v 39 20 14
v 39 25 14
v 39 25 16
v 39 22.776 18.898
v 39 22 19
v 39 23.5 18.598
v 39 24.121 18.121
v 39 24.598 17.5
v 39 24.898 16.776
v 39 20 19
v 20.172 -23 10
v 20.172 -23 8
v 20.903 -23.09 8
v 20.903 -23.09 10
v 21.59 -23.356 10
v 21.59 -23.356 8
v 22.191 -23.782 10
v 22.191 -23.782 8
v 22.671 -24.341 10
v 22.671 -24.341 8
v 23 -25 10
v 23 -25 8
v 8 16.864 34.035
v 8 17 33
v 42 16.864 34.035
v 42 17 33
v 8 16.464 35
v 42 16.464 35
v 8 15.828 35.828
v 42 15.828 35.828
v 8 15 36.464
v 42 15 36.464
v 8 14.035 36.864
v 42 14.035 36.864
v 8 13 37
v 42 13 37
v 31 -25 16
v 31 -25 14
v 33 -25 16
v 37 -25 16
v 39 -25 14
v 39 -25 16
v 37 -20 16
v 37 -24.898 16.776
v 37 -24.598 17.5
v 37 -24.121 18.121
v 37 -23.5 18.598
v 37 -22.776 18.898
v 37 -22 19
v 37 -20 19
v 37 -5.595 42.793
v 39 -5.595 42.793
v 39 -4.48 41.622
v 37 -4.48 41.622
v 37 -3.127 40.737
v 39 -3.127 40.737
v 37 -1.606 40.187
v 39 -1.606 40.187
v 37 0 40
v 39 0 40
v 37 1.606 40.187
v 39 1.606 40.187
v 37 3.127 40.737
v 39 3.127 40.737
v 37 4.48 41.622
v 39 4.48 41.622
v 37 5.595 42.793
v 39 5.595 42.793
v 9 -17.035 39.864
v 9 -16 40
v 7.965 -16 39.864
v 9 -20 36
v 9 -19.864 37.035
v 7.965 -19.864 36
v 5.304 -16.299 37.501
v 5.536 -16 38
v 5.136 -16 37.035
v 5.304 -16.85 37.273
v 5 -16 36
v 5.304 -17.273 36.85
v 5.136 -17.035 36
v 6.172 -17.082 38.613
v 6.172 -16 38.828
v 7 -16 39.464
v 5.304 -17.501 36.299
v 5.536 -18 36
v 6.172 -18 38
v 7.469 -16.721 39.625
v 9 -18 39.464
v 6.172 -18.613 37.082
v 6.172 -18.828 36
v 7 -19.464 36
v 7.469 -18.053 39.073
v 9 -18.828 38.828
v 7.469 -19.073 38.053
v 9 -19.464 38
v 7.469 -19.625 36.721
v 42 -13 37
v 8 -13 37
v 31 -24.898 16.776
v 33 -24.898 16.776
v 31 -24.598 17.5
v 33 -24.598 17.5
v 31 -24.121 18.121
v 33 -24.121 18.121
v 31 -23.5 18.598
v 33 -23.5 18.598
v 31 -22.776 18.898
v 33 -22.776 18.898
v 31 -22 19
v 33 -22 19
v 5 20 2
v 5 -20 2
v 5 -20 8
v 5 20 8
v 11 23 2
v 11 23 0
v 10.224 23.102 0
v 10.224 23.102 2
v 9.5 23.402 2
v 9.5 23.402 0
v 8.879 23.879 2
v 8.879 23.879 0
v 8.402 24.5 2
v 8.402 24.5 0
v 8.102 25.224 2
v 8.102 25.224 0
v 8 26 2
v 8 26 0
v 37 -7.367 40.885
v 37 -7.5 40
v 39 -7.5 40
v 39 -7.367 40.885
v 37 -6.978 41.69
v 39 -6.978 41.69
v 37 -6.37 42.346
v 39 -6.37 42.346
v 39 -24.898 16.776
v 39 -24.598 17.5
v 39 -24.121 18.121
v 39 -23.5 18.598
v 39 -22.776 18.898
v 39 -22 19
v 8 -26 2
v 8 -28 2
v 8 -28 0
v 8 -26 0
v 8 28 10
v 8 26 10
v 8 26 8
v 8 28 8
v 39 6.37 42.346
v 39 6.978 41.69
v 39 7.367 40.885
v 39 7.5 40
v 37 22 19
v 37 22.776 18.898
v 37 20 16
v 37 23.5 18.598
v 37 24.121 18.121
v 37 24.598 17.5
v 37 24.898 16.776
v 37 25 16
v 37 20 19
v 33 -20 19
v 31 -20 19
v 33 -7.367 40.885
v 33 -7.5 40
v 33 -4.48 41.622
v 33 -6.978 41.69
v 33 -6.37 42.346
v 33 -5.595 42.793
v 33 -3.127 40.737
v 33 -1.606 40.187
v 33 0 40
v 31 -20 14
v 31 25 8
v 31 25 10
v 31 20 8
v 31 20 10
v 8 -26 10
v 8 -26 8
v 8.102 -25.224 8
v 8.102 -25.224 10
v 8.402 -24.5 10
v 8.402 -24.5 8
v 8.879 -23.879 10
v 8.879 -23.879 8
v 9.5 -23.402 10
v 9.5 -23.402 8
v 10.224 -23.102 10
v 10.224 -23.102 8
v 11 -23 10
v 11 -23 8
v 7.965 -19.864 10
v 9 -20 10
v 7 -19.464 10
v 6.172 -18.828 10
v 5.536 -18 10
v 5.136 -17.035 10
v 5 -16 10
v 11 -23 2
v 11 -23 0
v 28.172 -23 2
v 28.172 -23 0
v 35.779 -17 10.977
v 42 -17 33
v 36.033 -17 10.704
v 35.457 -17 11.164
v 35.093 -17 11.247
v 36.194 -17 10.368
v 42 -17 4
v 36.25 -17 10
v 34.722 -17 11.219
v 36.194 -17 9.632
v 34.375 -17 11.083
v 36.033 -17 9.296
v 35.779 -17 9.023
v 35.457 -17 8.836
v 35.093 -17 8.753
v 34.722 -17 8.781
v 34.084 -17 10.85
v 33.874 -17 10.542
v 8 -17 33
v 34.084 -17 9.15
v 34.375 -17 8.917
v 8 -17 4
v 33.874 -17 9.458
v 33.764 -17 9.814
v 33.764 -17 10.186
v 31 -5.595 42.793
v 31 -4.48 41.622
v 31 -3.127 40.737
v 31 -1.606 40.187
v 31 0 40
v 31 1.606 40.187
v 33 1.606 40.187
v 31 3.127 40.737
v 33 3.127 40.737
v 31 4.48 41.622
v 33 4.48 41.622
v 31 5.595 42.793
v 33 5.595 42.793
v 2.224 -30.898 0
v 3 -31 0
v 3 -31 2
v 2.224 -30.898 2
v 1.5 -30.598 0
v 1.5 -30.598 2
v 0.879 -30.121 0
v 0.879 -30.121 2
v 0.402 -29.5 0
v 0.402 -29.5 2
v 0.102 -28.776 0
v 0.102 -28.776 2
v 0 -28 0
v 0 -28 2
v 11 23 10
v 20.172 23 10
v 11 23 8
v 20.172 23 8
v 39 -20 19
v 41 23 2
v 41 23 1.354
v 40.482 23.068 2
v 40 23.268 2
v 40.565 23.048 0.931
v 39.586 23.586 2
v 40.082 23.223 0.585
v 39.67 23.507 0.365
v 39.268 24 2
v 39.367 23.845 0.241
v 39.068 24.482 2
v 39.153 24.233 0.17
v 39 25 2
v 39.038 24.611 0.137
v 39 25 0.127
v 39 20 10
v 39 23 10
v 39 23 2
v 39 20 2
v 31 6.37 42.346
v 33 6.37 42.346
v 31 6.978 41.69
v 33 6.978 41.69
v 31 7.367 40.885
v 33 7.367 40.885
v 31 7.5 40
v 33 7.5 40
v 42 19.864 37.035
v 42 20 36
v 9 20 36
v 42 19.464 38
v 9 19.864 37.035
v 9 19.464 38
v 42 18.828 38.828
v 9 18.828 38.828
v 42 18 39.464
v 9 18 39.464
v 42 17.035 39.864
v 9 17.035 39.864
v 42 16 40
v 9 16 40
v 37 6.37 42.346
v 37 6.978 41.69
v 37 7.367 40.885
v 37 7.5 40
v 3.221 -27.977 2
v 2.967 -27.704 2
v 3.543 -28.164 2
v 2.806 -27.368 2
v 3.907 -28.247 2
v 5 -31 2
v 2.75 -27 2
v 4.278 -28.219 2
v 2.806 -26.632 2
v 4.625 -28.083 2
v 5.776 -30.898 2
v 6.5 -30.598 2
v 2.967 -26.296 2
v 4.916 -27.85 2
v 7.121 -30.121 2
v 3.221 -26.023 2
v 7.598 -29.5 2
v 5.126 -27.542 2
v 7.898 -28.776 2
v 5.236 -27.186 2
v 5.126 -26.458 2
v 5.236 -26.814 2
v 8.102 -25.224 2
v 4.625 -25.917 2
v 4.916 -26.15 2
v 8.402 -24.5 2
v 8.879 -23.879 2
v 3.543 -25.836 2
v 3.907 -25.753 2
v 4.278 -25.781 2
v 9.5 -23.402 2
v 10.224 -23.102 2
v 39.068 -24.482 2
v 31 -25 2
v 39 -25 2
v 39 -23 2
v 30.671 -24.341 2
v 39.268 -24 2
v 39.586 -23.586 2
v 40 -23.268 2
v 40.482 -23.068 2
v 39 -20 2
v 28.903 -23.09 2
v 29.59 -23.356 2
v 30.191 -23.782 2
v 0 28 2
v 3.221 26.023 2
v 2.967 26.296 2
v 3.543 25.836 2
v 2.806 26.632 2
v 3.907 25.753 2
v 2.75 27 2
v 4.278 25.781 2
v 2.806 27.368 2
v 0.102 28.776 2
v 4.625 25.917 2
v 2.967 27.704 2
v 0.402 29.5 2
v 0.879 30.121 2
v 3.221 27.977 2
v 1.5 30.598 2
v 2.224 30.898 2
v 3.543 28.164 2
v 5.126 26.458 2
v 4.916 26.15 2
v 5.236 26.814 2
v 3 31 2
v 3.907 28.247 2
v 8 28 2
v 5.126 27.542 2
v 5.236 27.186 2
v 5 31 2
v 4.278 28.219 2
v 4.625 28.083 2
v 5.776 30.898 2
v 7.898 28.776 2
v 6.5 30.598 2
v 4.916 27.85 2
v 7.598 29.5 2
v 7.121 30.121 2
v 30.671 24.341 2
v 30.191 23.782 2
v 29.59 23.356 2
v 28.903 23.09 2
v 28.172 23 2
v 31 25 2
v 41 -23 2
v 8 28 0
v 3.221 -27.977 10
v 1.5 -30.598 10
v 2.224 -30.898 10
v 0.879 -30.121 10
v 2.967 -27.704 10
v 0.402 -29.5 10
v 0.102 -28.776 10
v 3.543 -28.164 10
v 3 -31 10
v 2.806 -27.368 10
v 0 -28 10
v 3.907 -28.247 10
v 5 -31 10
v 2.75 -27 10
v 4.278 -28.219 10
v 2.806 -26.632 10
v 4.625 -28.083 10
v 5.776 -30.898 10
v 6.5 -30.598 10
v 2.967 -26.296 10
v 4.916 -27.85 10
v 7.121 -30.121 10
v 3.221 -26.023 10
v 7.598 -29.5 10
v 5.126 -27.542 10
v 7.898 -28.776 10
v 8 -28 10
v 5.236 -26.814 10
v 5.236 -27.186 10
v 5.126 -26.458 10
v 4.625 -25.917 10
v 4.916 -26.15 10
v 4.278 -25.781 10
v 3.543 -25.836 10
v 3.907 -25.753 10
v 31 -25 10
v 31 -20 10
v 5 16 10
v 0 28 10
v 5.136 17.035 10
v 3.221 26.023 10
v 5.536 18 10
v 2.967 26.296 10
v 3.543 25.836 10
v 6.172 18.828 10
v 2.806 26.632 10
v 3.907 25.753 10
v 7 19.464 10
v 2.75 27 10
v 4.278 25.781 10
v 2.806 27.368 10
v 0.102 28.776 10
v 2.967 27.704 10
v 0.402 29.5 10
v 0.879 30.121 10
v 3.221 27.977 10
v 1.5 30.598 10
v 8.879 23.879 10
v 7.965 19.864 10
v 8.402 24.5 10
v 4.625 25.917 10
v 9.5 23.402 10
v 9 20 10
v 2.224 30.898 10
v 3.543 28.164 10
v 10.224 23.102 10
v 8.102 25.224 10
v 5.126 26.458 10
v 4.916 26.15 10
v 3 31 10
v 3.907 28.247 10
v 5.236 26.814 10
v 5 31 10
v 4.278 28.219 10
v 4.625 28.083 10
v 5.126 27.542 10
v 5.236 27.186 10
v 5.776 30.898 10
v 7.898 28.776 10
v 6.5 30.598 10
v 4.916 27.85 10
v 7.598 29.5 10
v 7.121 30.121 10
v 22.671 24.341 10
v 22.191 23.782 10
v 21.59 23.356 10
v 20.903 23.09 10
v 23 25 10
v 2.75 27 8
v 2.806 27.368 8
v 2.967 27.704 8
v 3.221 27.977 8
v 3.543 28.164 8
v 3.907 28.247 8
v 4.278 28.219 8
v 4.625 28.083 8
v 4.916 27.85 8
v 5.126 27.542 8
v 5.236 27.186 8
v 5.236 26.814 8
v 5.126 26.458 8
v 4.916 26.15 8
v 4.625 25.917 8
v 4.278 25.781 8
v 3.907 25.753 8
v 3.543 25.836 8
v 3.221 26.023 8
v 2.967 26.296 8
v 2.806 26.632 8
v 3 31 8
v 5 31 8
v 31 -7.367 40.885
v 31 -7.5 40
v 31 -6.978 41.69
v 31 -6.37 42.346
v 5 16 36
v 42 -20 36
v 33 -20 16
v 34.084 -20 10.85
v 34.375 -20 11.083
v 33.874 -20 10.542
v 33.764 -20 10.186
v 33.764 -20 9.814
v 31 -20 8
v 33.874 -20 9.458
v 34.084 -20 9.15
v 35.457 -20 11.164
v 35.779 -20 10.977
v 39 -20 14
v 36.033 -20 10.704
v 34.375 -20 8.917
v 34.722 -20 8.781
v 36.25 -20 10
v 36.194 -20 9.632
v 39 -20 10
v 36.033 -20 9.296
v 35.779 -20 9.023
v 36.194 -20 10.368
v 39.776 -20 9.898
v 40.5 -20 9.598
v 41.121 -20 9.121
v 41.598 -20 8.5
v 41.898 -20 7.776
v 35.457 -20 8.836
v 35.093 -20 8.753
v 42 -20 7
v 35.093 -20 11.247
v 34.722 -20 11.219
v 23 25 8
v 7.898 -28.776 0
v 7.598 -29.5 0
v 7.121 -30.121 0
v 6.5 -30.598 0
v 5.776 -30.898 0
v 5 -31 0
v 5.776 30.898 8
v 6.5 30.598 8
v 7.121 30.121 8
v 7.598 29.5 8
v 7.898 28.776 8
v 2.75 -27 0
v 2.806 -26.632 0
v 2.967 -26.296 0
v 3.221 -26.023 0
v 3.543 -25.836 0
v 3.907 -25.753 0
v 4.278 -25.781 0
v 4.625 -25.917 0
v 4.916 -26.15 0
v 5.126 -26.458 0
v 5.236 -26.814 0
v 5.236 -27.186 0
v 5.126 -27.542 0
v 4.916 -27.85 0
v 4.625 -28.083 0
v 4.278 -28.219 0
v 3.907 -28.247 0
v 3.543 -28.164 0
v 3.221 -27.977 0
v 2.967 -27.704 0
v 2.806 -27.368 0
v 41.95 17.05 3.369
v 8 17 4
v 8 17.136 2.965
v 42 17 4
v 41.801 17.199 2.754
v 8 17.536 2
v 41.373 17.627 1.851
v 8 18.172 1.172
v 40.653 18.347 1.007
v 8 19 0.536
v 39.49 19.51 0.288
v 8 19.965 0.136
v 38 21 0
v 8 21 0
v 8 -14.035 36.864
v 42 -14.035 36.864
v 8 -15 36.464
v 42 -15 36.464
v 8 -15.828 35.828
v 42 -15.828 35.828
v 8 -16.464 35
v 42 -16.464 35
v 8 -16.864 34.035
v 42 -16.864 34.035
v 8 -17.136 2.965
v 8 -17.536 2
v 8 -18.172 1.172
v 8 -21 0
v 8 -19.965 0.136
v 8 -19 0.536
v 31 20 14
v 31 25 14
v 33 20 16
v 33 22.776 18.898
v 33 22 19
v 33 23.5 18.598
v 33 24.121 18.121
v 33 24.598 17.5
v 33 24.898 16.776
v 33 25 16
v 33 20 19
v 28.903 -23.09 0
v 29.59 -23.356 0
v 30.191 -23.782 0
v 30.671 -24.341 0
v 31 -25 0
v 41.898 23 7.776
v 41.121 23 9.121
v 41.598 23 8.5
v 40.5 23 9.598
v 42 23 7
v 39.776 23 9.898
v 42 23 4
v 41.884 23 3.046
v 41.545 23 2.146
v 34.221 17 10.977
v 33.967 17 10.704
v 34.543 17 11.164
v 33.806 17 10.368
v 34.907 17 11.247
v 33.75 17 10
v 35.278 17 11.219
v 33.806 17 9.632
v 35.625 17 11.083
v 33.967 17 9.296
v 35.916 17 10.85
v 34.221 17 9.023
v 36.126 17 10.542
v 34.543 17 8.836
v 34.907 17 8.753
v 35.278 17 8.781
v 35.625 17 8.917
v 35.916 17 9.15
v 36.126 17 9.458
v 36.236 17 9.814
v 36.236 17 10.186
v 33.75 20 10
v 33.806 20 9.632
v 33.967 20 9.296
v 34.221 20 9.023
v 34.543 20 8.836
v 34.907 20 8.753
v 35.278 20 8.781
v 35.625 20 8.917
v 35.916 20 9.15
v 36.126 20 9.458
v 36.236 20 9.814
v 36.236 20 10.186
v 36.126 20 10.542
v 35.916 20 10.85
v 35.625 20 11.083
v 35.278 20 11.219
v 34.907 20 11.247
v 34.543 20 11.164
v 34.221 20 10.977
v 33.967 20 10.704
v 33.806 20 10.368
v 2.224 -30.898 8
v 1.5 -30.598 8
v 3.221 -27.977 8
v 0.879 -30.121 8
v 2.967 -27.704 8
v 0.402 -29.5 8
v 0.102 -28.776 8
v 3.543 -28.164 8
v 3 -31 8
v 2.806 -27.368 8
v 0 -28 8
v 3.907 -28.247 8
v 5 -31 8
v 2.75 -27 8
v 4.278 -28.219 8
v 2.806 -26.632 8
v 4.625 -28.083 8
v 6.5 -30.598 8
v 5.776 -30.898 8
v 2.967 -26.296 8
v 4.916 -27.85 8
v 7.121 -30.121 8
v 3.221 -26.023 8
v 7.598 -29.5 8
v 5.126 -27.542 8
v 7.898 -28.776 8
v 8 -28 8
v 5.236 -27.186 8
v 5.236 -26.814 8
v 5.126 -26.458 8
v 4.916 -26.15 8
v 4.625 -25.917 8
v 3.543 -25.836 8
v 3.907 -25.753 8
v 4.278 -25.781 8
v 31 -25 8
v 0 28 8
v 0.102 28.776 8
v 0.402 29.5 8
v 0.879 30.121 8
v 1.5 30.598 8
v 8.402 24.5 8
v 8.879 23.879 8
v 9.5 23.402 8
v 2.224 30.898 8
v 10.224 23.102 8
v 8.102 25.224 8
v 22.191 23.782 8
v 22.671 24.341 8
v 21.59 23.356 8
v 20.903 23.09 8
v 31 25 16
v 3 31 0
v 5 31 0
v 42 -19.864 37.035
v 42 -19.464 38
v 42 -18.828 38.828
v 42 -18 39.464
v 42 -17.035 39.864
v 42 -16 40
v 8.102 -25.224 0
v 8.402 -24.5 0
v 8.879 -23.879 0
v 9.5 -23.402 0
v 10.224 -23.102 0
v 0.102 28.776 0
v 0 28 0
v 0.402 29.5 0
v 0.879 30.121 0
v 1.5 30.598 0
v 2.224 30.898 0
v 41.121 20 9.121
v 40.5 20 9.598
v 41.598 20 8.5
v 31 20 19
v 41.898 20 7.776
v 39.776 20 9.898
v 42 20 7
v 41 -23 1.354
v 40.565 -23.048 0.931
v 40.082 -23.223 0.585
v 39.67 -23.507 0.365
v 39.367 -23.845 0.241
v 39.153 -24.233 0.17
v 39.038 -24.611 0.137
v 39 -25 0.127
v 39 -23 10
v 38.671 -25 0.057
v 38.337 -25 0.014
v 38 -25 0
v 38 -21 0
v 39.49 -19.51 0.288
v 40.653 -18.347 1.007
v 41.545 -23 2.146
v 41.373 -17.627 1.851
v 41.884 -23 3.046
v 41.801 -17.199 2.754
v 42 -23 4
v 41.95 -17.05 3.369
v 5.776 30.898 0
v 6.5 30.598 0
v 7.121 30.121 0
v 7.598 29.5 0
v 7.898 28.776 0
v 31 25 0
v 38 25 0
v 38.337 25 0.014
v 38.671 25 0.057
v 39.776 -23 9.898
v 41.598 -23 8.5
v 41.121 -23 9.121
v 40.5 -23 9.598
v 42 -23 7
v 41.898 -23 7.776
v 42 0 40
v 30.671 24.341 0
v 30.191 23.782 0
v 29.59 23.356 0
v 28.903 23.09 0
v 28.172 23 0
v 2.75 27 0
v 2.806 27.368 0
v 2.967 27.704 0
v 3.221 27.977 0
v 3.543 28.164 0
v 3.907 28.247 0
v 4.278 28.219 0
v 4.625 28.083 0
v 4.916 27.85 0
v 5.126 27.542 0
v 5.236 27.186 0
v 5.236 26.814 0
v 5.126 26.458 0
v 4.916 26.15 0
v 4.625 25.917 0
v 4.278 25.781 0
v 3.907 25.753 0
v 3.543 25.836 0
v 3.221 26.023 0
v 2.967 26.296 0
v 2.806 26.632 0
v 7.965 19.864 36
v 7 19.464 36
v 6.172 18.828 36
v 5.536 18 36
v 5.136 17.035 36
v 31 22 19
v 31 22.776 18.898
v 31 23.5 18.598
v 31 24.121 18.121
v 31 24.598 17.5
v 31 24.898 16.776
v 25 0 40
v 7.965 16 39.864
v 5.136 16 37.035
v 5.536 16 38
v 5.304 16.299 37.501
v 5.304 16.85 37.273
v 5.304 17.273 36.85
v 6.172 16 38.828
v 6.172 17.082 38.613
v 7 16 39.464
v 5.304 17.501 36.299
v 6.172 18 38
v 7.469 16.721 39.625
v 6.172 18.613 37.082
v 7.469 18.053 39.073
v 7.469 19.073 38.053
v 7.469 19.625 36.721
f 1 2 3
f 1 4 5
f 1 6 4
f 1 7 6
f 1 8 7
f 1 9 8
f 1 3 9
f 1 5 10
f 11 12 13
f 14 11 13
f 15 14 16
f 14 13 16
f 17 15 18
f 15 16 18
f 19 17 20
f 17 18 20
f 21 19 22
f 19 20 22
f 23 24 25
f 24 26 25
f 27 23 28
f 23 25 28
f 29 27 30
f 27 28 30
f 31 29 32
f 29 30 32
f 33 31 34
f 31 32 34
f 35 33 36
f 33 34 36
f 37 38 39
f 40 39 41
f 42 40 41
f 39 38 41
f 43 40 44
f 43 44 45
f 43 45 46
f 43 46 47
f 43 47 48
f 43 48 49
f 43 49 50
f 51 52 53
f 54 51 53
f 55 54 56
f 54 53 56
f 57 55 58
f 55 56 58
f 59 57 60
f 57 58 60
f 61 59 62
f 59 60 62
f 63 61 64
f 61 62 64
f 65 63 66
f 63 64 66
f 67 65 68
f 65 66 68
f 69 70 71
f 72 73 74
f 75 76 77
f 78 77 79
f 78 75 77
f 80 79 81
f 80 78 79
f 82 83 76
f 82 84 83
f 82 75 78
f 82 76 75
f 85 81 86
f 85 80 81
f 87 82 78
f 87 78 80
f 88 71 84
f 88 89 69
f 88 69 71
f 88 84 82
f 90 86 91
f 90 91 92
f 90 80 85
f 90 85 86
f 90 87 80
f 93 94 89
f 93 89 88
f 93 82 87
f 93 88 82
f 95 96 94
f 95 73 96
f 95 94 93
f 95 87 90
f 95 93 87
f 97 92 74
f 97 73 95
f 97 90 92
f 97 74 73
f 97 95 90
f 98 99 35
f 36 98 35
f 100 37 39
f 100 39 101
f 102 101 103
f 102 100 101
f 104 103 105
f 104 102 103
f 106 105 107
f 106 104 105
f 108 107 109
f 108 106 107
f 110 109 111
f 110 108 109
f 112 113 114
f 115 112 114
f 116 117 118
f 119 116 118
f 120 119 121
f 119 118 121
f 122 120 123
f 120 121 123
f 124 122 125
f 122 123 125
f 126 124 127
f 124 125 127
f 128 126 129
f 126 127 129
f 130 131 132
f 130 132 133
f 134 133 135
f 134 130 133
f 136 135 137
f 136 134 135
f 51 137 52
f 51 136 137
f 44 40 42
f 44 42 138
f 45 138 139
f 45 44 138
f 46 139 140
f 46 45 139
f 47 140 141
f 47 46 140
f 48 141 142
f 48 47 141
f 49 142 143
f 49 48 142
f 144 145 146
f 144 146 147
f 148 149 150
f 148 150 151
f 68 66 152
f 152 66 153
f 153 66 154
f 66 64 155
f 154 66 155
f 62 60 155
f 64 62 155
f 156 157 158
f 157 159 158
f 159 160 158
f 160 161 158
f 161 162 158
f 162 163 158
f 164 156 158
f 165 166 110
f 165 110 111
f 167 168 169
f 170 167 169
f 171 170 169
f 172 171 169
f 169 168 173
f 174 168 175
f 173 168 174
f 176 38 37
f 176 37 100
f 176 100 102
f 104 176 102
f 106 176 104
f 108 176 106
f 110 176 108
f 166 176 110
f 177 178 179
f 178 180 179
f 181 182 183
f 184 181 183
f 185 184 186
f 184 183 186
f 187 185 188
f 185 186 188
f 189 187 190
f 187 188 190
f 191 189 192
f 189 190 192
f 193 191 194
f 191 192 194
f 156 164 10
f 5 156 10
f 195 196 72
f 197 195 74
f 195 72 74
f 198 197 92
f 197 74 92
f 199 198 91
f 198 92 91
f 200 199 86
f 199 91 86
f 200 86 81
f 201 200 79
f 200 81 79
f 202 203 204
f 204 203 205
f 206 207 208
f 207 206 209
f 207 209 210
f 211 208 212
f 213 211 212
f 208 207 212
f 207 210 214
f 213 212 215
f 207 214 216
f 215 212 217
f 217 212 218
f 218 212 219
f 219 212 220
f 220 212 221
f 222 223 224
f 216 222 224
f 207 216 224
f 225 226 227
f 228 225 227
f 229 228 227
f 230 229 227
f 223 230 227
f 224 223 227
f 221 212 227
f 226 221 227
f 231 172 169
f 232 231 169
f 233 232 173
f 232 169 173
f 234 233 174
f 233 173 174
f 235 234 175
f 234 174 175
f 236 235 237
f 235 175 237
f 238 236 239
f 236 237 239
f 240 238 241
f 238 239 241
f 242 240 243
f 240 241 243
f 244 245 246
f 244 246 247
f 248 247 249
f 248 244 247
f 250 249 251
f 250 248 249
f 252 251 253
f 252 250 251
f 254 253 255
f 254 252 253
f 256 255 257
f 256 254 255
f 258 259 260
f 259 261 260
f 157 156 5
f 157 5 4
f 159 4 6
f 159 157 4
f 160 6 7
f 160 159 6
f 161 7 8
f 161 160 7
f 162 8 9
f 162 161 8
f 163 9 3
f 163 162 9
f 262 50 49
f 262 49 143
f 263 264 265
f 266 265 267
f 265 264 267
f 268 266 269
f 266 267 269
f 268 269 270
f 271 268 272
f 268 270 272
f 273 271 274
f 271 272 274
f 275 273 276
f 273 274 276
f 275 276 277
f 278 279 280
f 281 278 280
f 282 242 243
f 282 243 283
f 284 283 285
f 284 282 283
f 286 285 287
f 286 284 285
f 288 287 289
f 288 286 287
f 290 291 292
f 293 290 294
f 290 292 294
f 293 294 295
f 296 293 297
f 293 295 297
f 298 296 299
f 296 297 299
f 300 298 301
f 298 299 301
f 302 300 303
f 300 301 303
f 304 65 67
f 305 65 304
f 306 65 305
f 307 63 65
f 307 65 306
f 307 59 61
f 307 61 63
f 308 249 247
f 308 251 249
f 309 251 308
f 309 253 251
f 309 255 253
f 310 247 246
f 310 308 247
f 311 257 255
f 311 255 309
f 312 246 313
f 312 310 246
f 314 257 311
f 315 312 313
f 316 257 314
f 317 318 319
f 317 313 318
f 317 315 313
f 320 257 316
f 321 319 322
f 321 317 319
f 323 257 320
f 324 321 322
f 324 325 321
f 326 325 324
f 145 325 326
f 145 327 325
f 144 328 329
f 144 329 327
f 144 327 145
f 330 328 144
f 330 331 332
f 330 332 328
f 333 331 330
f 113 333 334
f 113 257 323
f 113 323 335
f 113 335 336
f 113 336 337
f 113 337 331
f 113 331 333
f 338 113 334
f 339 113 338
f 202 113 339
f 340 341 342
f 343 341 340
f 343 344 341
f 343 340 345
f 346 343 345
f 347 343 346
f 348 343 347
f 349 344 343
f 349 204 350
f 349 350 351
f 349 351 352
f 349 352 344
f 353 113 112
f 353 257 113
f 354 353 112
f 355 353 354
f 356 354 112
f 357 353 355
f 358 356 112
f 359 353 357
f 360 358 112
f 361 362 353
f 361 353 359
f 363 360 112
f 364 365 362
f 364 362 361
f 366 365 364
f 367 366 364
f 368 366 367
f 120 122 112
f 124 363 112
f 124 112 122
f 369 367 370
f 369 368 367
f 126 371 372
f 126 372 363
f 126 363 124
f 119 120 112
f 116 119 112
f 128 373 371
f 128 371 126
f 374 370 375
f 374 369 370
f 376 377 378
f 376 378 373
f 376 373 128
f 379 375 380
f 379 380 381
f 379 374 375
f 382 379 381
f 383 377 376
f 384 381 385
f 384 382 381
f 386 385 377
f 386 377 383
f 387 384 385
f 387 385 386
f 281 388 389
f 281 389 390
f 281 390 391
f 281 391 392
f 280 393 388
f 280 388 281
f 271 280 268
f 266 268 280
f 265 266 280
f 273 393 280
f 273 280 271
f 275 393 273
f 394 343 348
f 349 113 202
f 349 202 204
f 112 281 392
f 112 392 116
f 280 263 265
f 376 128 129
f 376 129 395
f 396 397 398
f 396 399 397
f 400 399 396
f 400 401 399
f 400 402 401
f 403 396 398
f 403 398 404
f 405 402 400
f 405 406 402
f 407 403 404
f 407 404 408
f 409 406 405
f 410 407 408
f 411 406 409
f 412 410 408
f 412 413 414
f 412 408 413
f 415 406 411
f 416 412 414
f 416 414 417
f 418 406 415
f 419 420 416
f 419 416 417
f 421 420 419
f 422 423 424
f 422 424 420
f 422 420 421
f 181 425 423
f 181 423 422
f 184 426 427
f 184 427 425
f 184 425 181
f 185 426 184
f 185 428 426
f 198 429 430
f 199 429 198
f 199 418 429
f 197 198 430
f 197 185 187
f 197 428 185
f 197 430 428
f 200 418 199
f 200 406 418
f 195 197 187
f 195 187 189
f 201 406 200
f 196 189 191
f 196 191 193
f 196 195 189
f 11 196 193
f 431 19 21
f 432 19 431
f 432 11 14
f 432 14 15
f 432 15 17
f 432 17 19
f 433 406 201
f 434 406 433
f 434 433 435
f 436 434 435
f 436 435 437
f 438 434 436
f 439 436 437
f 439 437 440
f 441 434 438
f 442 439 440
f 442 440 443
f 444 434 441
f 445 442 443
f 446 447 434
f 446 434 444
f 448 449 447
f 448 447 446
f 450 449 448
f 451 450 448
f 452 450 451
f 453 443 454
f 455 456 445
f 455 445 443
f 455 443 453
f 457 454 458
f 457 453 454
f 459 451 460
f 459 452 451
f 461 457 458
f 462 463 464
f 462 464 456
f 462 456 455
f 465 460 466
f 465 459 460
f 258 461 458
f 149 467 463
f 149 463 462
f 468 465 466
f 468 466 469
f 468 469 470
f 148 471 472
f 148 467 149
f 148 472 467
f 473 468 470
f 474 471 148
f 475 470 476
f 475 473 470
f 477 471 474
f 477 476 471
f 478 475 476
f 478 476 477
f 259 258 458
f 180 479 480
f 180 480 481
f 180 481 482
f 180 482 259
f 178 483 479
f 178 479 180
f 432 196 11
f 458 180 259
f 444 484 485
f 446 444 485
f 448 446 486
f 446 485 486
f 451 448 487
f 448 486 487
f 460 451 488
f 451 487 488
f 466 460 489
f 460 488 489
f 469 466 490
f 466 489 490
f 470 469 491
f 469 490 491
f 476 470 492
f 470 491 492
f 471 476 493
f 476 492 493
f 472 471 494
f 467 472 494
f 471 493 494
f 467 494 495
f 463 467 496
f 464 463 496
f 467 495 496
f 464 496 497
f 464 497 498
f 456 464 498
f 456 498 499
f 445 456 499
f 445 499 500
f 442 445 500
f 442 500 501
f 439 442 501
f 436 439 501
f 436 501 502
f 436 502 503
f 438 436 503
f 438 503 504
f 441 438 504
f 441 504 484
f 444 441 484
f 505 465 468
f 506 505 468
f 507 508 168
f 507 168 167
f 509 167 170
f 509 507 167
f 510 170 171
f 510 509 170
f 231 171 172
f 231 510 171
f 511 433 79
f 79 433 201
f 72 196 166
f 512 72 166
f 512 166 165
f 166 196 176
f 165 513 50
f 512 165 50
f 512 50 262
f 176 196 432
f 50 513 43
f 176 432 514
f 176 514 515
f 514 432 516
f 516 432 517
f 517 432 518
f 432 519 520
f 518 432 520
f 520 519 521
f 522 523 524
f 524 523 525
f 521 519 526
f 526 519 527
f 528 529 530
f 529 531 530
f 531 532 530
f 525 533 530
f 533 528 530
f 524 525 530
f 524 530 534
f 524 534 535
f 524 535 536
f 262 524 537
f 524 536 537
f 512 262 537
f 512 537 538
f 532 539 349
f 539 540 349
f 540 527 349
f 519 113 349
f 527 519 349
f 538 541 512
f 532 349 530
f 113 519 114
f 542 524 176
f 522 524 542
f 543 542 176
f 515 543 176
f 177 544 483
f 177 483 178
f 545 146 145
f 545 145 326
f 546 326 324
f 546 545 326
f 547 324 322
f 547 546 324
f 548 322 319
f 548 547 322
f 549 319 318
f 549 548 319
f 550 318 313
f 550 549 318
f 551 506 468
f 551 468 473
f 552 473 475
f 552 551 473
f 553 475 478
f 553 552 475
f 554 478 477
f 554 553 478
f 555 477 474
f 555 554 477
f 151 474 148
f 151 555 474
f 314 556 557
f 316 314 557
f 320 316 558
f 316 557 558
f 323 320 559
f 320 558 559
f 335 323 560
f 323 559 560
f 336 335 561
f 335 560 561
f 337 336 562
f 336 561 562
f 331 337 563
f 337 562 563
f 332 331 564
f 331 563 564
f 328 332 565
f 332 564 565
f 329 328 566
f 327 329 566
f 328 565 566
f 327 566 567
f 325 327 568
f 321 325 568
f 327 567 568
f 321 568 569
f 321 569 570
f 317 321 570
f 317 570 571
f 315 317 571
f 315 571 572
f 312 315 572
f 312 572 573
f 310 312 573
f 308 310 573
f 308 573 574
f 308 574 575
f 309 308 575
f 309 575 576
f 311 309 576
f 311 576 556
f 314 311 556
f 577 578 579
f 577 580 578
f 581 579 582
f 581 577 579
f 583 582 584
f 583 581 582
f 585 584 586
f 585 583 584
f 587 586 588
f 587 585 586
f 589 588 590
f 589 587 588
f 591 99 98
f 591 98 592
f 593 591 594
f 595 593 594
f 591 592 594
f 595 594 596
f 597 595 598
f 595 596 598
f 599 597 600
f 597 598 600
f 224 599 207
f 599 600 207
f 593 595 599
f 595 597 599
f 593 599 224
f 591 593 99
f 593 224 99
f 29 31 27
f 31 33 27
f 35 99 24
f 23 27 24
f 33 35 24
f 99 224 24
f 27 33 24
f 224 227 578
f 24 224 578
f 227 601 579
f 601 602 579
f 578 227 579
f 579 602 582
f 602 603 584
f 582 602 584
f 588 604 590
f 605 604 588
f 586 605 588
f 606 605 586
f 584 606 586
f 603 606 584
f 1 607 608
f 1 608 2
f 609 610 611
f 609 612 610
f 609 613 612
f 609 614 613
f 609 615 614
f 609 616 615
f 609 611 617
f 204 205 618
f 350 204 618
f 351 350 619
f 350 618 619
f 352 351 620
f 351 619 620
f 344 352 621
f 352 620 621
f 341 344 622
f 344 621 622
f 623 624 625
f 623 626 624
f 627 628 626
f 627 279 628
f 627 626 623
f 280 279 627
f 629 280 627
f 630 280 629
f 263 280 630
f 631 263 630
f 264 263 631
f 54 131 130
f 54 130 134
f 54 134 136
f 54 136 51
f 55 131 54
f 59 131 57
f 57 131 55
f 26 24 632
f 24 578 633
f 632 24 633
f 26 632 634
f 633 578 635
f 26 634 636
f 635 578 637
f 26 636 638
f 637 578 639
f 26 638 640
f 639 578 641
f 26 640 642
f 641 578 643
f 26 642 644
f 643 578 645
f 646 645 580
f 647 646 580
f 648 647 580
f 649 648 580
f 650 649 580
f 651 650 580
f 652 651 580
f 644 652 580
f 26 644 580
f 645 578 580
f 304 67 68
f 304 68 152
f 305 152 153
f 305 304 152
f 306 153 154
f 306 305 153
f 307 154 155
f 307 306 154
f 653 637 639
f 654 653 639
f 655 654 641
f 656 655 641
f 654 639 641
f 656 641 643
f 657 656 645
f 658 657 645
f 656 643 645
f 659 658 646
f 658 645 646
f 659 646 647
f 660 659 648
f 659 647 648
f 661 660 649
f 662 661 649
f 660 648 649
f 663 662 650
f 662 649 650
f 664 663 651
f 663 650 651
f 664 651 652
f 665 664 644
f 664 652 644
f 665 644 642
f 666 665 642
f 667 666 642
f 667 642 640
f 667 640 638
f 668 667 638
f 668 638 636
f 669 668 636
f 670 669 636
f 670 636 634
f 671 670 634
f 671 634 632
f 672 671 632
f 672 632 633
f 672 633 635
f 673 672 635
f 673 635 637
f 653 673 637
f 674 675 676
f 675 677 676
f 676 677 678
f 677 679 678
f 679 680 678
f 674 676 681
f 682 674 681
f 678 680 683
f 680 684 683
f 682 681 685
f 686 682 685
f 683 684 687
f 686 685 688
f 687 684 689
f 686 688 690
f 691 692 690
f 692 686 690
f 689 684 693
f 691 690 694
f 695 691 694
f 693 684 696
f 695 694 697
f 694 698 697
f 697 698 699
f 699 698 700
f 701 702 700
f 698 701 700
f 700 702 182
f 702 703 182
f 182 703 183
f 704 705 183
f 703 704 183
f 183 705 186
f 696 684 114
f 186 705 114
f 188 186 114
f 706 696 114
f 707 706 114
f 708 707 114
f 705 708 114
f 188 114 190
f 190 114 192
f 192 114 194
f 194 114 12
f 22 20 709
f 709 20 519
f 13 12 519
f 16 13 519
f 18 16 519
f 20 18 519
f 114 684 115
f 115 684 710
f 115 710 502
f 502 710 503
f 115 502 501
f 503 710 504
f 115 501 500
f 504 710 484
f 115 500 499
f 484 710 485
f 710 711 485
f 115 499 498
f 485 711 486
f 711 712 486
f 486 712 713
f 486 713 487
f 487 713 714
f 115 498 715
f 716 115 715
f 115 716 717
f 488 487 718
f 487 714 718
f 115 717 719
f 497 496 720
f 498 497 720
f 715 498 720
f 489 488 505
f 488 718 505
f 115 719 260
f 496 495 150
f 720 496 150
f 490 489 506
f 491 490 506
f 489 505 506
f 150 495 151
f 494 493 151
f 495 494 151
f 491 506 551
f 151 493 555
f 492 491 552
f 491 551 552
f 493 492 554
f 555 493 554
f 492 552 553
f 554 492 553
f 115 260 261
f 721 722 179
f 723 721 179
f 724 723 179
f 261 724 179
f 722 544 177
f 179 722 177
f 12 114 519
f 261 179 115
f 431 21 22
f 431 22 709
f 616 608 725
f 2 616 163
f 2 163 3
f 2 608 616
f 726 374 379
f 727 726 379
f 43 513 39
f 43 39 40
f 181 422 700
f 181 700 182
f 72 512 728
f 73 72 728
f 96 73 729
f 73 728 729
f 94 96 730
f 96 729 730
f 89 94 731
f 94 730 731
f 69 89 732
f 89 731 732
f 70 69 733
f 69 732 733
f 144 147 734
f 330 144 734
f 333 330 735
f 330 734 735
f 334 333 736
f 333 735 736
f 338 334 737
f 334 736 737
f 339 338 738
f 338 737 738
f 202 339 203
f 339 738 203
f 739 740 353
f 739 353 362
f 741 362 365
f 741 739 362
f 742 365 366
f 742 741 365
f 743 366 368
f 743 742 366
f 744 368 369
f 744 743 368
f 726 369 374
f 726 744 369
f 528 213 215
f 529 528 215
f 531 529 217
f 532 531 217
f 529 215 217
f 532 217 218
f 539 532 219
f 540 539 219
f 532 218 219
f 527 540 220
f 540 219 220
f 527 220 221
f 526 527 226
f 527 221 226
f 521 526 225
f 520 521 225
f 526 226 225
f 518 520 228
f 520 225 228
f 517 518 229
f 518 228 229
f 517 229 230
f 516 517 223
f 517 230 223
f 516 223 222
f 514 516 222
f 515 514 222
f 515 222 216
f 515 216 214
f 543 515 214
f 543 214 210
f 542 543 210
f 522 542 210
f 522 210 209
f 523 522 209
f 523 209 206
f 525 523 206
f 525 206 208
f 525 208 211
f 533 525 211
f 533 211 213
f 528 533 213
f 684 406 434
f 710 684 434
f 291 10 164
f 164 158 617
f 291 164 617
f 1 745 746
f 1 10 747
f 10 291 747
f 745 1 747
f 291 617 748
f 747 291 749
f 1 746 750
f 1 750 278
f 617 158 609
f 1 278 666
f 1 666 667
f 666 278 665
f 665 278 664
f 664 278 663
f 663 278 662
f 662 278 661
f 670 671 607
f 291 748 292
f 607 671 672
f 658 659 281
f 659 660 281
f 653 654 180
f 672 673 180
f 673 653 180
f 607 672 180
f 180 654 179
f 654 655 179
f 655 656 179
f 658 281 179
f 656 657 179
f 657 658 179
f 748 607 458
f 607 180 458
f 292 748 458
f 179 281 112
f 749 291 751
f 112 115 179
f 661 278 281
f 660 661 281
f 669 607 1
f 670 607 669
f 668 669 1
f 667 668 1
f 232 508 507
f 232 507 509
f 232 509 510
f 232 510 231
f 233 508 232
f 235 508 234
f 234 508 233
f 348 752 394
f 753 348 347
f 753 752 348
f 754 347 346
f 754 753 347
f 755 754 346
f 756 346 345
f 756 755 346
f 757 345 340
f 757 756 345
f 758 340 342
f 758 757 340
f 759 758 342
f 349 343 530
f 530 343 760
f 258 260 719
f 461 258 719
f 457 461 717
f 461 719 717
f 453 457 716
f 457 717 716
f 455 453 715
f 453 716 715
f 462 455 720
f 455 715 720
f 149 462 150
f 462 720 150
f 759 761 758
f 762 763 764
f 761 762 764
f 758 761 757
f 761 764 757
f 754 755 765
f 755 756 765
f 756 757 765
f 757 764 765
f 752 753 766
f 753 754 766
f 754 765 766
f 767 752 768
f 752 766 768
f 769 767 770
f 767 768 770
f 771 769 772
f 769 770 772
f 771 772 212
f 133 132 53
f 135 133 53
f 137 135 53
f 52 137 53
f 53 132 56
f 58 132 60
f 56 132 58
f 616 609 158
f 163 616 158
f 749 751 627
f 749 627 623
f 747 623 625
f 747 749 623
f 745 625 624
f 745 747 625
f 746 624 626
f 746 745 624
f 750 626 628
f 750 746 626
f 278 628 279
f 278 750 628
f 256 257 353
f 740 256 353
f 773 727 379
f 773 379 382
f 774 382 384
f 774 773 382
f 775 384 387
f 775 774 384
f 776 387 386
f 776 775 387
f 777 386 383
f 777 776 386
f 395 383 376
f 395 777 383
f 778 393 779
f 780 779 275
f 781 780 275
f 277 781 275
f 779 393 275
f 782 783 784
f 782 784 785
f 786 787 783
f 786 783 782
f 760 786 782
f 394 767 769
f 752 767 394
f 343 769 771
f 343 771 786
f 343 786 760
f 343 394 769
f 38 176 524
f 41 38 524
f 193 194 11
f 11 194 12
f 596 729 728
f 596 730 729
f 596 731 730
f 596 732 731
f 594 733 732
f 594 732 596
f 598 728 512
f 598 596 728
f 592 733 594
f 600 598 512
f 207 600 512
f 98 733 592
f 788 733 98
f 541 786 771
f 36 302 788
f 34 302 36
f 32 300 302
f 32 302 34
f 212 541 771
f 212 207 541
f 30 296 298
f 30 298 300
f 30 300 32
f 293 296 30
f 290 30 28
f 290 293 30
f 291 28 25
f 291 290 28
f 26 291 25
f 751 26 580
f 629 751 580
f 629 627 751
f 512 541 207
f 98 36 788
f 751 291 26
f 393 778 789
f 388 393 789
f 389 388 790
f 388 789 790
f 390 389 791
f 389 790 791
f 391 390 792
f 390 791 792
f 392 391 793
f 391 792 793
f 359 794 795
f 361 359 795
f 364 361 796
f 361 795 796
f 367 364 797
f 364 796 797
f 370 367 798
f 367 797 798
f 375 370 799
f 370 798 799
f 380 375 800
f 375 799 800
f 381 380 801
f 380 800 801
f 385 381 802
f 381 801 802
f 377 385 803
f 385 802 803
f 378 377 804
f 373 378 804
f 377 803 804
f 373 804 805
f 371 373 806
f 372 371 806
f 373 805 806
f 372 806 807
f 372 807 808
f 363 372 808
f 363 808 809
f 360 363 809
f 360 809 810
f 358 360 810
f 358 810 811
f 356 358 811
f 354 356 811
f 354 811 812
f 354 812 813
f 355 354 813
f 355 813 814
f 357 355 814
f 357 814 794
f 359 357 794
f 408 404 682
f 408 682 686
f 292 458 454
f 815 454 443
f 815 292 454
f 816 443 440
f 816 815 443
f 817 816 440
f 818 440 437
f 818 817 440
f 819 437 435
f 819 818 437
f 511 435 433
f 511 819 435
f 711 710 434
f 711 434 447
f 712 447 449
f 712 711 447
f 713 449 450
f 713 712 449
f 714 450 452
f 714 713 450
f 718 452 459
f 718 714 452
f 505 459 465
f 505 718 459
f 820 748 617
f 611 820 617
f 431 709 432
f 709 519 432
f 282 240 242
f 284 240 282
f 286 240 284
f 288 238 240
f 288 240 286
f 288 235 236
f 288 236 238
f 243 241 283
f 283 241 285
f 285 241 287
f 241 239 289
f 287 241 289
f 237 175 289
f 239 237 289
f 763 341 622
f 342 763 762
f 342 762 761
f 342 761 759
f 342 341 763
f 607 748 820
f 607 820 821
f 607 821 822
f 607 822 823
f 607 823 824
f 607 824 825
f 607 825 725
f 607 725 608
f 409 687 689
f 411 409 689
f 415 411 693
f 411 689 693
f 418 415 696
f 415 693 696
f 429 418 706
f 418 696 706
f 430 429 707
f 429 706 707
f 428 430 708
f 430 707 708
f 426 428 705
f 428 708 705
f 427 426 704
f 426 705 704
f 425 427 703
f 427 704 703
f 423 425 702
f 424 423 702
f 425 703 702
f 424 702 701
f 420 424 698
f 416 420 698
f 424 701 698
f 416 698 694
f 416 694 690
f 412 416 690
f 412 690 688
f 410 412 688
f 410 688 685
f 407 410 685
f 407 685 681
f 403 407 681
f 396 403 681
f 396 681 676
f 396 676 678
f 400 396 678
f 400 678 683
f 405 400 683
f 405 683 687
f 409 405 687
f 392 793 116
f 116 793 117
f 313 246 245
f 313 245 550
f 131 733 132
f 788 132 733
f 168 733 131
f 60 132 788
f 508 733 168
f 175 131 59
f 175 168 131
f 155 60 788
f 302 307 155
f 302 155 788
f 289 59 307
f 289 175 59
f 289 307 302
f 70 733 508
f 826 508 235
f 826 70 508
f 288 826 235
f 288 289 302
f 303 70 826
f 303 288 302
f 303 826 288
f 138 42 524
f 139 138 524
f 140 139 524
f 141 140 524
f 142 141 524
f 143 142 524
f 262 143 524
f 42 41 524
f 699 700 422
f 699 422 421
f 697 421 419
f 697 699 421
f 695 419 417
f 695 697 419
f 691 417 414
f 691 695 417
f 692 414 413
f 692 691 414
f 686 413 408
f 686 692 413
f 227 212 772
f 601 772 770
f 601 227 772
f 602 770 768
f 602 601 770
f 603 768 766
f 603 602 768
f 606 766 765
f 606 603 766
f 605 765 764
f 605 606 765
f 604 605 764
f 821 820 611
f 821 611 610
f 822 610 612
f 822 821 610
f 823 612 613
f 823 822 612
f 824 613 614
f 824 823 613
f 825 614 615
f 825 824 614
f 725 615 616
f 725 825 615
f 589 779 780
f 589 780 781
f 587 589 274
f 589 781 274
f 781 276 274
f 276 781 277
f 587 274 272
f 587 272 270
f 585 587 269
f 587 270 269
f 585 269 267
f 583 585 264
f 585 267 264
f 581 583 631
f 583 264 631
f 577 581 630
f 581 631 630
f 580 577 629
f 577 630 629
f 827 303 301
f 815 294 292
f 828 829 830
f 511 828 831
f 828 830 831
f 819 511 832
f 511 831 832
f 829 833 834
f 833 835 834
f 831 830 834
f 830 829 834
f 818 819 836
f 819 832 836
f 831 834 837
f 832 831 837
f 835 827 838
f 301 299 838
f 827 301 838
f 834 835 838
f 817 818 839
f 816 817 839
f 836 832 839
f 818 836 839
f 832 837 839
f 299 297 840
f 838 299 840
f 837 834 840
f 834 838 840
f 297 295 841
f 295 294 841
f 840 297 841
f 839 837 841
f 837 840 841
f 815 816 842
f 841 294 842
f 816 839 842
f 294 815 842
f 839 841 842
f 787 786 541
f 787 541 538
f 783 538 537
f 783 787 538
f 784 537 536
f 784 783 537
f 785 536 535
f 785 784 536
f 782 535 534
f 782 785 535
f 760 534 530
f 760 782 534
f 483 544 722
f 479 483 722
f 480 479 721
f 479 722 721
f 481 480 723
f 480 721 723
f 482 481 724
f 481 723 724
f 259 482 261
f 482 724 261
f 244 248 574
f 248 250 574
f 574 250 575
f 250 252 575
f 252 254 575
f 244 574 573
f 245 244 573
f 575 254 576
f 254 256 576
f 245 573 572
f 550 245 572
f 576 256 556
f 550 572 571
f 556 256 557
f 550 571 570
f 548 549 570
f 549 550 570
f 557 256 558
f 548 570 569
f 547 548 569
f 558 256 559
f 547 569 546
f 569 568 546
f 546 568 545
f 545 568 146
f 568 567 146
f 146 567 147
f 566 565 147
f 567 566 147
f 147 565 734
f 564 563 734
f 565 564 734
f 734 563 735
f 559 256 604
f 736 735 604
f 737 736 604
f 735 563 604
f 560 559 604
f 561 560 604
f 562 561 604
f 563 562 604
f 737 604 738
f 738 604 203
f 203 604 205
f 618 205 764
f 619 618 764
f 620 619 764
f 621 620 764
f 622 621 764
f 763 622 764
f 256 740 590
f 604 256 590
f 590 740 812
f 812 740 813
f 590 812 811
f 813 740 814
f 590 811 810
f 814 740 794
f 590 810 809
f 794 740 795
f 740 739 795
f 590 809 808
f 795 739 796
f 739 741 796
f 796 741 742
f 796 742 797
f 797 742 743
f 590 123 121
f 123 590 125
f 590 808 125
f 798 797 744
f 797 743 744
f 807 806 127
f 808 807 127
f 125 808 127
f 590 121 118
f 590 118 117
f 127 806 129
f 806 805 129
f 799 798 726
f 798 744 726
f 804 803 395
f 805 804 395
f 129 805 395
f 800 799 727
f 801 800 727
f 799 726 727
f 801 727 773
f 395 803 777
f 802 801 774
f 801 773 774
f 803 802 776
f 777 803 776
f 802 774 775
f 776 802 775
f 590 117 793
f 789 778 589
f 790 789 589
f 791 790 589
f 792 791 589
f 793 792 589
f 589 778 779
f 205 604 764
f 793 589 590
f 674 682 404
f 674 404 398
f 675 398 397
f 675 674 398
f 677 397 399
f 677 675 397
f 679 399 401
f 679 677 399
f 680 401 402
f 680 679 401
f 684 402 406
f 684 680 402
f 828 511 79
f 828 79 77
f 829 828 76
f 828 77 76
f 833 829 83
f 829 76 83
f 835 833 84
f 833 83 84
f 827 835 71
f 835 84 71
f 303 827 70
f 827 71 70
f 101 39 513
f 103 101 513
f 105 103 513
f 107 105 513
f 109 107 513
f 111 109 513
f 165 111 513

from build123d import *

# Parameters (mm, degrees)
ESTRUSIONE_ESTRUSIONE1_DEPTH  = 10
SCHIZZO6_W                    = 8
SCHIZZO6_H                    = 8
SCHIZZO6_H_2                  = 2
ESTRUSIONE_ESTRUSIONE4_DEPTH  = 10
TAGLIO_ESTRUSIONE1_DEPTH      = 54.150729064
SCHIZZO4_W                    = 3
SCHIZZO4_H                    = 6
ESTRUSIONE_ESTRUSIONE2_DEPTH  = 3
SCHIZZO5_W                    = 3
SCHIZZO5_H                    = 6
ESTRUSIONE_ESTRUSIONE3_DEPTH  = 3
SCHIZZO3_W                    = 5
SCHIZZO3_H                    = 6
TAGLIO_ESTRUSIONE2_DEPTH      = 67.820655489
FORO_FILETTATO_M3X0_5_1_D     = 2.5
ESTRUSIONE_ESTRUSIONE5_DEPTH  = 30
SCHIZZO10_W                   = 3
SCHIZZO10_H                   = 34
ESTRUSIONE_ESTRUSIONE6_DEPTH  = 34
SCHIZZO18_W                   = 8
SCHIZZO18_H                   = 8
TAGLIO_ESTRUSIONE3_DEPTH      = 5
SCHIZZO24_W                   = 8
SCHIZZO24_H                   = 2
ESTRUSIONE_ESTRUSIONE9_DEPTH  = 5
SCHIZZO23_W                   = 8
SCHIZZO23_H                   = 8
TAGLIO_ESTRUSIONE4_DEPTH      = 5
SCHIZZO25_W                   = 8
SCHIZZO25_H                   = 2
ESTRUSIONE_ESTRUSIONE10_DEPTH = 5
FORO_FILETTATO_M3X0_5_4_D     = 2.5
FORO_FILETTATO_M3X0_5_4_DEPTH = 7.5
FORO_FILETTATO_M3X0_5_4_TIP   = 0.751075774
FORO_FILETTATO_M3X0_5_5_D     = 2.5
FORO_FILETTATO_M3X0_5_5_DEPTH = 7.5
FORO_FILETTATO_M3X0_5_5_TIP   = 0.751075774
SCHIZZO11_W                   = 2
SCHIZZO11_H                   = 15
ESTRUSIONE_ESTRUSIONE7_DEPTH  = 3
SCHIZZO12_W                   = 2
SCHIZZO12_H                   = 5
ESTRUSIONE_ESTRUSIONE8_DEPTH  = 3
SCHIZZO28_W                   = 8
SCHIZZO28_H                   = 2
ESTRUSIONE_ESTRUSIONE11_DEPTH = 2
SCHIZZO29_W                   = 8
SCHIZZO29_H                   = 2
ESTRUSIONE_ESTRUSIONE12_DEPTH = 2
RACCORDO1_R                   = 4
RACCORDO2_DEPTH               = 2
RACCORDO2_START               = 8
RACCORDO2_2_DEPTH             = 2
RACCORDO2_START_2             = -1
RACCORDO2_3_DEPTH             = 12
RACCORDO2_START_3             = -23
RACCORDO2_4_DEPTH             = 3
RACCORDO2_START_4             = 20
RACCORDO2_5_DEPTH             = 3
RACCORDO2_START_5             = 31
RACCORDO2_6_DEPTH             = 8
RACCORDO30_R                  = 2
SCHIZZO30_R                   = 7
TAGLIO_ESTRUSIONE5_DEPTH      = 17


with BuildPart() as part:
    # Schizzo1 → Estrusione-Estrusione1 (new body)
    with BuildSketch(Plane.XY):
        Polygon((0, -23), (42, -23), (42, -17), (8, -17), (8, 17), (42, 17), (42, 23), (0, 23), align=None)
    extrude(amount=ESTRUSIONE_ESTRUSIONE1_DEPTH)

    # Schizzo6 → Estrusione-Estrusione4 (add)
    with BuildSketch(Plane.XY.offset(10)):
        with Locations((4, -27)):
            Rectangle(SCHIZZO6_W, SCHIZZO6_H)
        with Locations((4, 27)):
            Rectangle(SCHIZZO6_W, SCHIZZO6_H)
        with Locations((35, -24)):
            Rectangle(SCHIZZO6_W, SCHIZZO6_H_2)
        with Locations((35, 24)):
            Rectangle(SCHIZZO6_W, SCHIZZO6_H_2)
    extrude(amount=-ESTRUSIONE_ESTRUSIONE4_DEPTH)

    # Schizzo2 → Taglio-Estrusione1 (cut, through all)
    with BuildSketch(Plane(origin=(42, 0, 0), x_dir=(0, 0, -1), z_dir=(1, 0, 0))):
        Polygon((-8, -23), (-8, -41.817102562), (-2, -41.817102562), (-2, -22.5), (-2, -20), (-8, -20), align=None)
    taglio_estrusione1 = extrude(amount=-TAGLIO_ESTRUSIONE1_DEPTH, mode=Mode.SUBTRACT)

    # Schizzo4 → Estrusione-Estrusione2 (add)
    with BuildSketch(Plane(origin=(0, -20, 0), x_dir=(-1, 0, 0), z_dir=(0, -1, 0))):
        with Locations((-40.5, -5)):
            Rectangle(SCHIZZO4_W, SCHIZZO4_H)
    extrude(amount=ESTRUSIONE_ESTRUSIONE2_DEPTH)

    # Specchia1: Taglio-Estrusione1 across plane
    add(taglio_estrusione1.mirror(Plane.ZX), mode=Mode.SUBTRACT)

    # Schizzo5 → Estrusione-Estrusione3 (add)
    with BuildSketch(Plane(origin=(0, 20, 0), x_dir=(1, 0, 0), z_dir=(0, 1, 0))):
        with Locations((40.5, -5)):
            Rectangle(SCHIZZO5_W, SCHIZZO5_H)
    extrude(amount=ESTRUSIONE_ESTRUSIONE3_DEPTH)

    # Schizzo3 → Taglio-Estrusione2 (cut, through all)
    with BuildSketch(Plane.XZ.offset(20)):
        with Locations((2.5, 5)):
            Rectangle(SCHIZZO3_W, SCHIZZO3_H)
    extrude(amount=-TAGLIO_ESTRUSIONE2_DEPTH, mode=Mode.SUBTRACT)

    # Foro filettato M3x0.5-1 (through all)
    with Locations(Plane.XY.offset(10)):
        with Locations((4, -27), (4, 27)):
            Hole(FORO_FILETTATO_M3X0_5_1_D / 2)

    # Schizzo9 → Estrusione-Estrusione5 (add)
    with BuildSketch(Plane.XY.offset(10)):
        Polygon((5, -20), (42, -20), (42, -17), (8, -17), (8, 17), (42, 17), (42, 20), (5, 20), align=None)
    extrude(amount=ESTRUSIONE_ESTRUSIONE5_DEPTH)

    # Schizzo10 → Estrusione-Estrusione6 (add)
    with BuildSketch(Plane(origin=(8, 0, 0), x_dir=(0, 0, -1), z_dir=(1, 0, 0))):
        with Locations((-38.5, 0)):
            Rectangle(SCHIZZO10_W, SCHIZZO10_H)
    extrude(amount=ESTRUSIONE_ESTRUSIONE6_DEPTH)

    # Schizzo18 → Taglio-Estrusione3 (cut)
    with BuildSketch(Plane.XZ.offset(25)):
        with Locations((35, 12)):
            Rectangle(SCHIZZO18_W, SCHIZZO18_H)
    extrude(amount=-TAGLIO_ESTRUSIONE3_DEPTH, mode=Mode.SUBTRACT)

    # Schizzo24 → Estrusione-Estrusione9 (add)
    with BuildSketch(Plane.XZ.offset(20)):
        with Locations((35, 15)):
            Rectangle(SCHIZZO24_W, SCHIZZO24_H)
    extrude(amount=ESTRUSIONE_ESTRUSIONE9_DEPTH)

    # Schizzo23 → Taglio-Estrusione4 (cut)
    with BuildSketch(Plane(origin=(0, 25, 0), x_dir=(1, 0, 0), z_dir=(0, 1, 0))):
        with Locations((35, -12)):
            Rectangle(SCHIZZO23_W, SCHIZZO23_H)
    extrude(amount=-TAGLIO_ESTRUSIONE4_DEPTH, mode=Mode.SUBTRACT)

    # Schizzo25 → Estrusione-Estrusione10 (add)
    with BuildSketch(Plane(origin=(0, 20, 0), x_dir=(1, 0, 0), z_dir=(0, 1, 0))):
        with Locations((35, -15)):
            Rectangle(SCHIZZO25_W, SCHIZZO25_H)
    extrude(amount=ESTRUSIONE_ESTRUSIONE10_DEPTH)

    # Foro filettato M3x0.5-4
    with Locations(Plane(origin=(0, -20, 0), x_dir=(-1, 0, 0), z_dir=(0, -1, 0))):
        with Locations((-35, -10)):
            Hole(FORO_FILETTATO_M3X0_5_4_D / 2, depth=FORO_FILETTATO_M3X0_5_4_DEPTH)
            with Locations((0, 0, -(FORO_FILETTATO_M3X0_5_4_DEPTH + FORO_FILETTATO_M3X0_5_4_TIP / 2))):  # 118° drill point
                Cone(0, FORO_FILETTATO_M3X0_5_4_D / 2, FORO_FILETTATO_M3X0_5_4_TIP, mode=Mode.SUBTRACT)

    # Foro filettato M3x0.5-5
    with Locations(Plane(origin=(0, 20, 0), x_dir=(1, 0, 0), z_dir=(0, 1, 0))):
        with Locations((35, -10)):
            Hole(FORO_FILETTATO_M3X0_5_5_D / 2, depth=FORO_FILETTATO_M3X0_5_5_DEPTH)
            with Locations((0, 0, -(FORO_FILETTATO_M3X0_5_5_DEPTH + FORO_FILETTATO_M3X0_5_5_TIP / 2))):  # 118° drill point
                Cone(0, FORO_FILETTATO_M3X0_5_5_D / 2, FORO_FILETTATO_M3X0_5_5_TIP, mode=Mode.SUBTRACT)

    # Schizzo11 → Estrusione-Estrusione7 (add)
    with BuildSketch(Plane.XY.offset(40)):
        with Locations((38, 0)):
            Rectangle(SCHIZZO11_W, SCHIZZO11_H)
        with Locations((32, 0)):
            Rectangle(SCHIZZO11_W, SCHIZZO11_H)
    extrude(amount=ESTRUSIONE_ESTRUSIONE7_DEPTH)

    # Schizzo12 → Estrusione-Estrusione8 (add)
    with BuildSketch(Plane.XY.offset(16)):
        with Locations((38, -22.5)):
            Rectangle(SCHIZZO12_W, SCHIZZO12_H)
        with Locations((32, -22.5)):
            Rectangle(SCHIZZO12_W, SCHIZZO12_H)
    estrusione_estrusione8 = extrude(amount=ESTRUSIONE_ESTRUSIONE8_DEPTH)

    # Schizzo28 → Estrusione-Estrusione11 (add)
    with BuildSketch(Plane.XZ.offset(23)):
        with Locations((27, 9)):
            Rectangle(SCHIZZO28_W, SCHIZZO28_H)
    extrude(amount=ESTRUSIONE_ESTRUSIONE11_DEPTH)

    # Schizzo29 → Estrusione-Estrusione12 (add)
    with BuildSketch(Plane(origin=(0, 23, 0), x_dir=(1, 0, 0), z_dir=(0, 1, 0))):
        with Locations((27, -9)):
            Rectangle(SCHIZZO29_W, SCHIZZO29_H)
    extrude(amount=ESTRUSIONE_ESTRUSIONE12_DEPTH)

    # Specchia2: Estrusione-Estrusione8 across plane
    add(estrusione_estrusione8.mirror(Plane.ZX))

    # Raccordo1
    raccordo1_edges = [part.edges().sort_by_distance(p)[0] for p in [
        (23.5, -20, 40),
        (23.5, 20, 40),
        (5, 0, 40),
        (5, 20, 25),
        (5, -20, 25),
        (42, 20, 0),
        (42, -20, 0),
        (25, -17, 37),
        (25, -17, 0),
        (25, 17, 37),
        (25, 17, 0),
    ]]
    fillet(raccordo1_edges, radius=RACCORDO1_R)

    # Raccordo2: read off the stored shape, not the designer's step
    # Raccordo2 outline → Raccordo2 (add)
    with BuildSketch(Plane.XY):
        with BuildLine():
            Line((8, -23), (8, -26))
            ThreePointArc((8, -26), (8.878679656, -23.878679656), (11, -23))
            Line((11, -23), (8, -23))
        make_face()
        with BuildLine():
            Line((8, 23), (11, 23))
            ThreePointArc((11, 23), (8.878679656, 23.878679656), (8, 26))
            Line((8, 26), (8, 23))
        make_face()
        with BuildLine():
            Line((31, 23), (31, 25))
            ThreePointArc((31, 25), (29.903623683, 23.550510257), (28.171572875, 23))
            Line((28.171572875, 23), (31, 23))
        make_face()
        with BuildLine():
            ThreePointArc((28.171572875, -23), (29.903623683, -23.550510257), (31, -25))
            Line((31, -25), (31, -23))
            Line((31, -23), (28.171572875, -23))
        make_face()
    extrude(amount=RACCORDO2_DEPTH)

    # Raccordo2 2 outline → Raccordo2 2 (add)
    with BuildSketch(Plane.XY.offset(RACCORDO2_START)):
        with BuildLine():
            ThreePointArc((23, 25), (21.903623683, 23.550510257), (20.171572875, 23))
            Line((20.171572875, 23), (23, 23))
            Line((23, 23), (23, 25))
        make_face()
        with BuildLine():
            Line((23, -23), (20.171572875, -23))
            ThreePointArc((20.171572875, -23), (21.903623683, -23.550510257), (23, -25))
            Line((23, -25), (23, -23))
        make_face()
        with BuildLine():
            Line((8, -23), (8, -26))
            ThreePointArc((8, -26), (8.878679656, -23.878679656), (11, -23))
            Line((11, -23), (8, -23))
        make_face()
        with BuildLine():
            Line((8, 23), (11, 23))
            ThreePointArc((11, 23), (8.878679656, 23.878679656), (8, 26))
            Line((8, 26), (8, 23))
        make_face()
    extrude(amount=RACCORDO2_2_DEPTH)

    # Raccordo2 3 outline → Raccordo2 3 (cut)
    with BuildSketch(Plane.XY.offset(RACCORDO2_START_2)):
        with BuildLine():
            ThreePointArc((8, -28), (7.121320344, -30.121320344), (5, -31))
            Line((5, -31), (8, -31))
            Line((8, -31), (8, -28))
        make_face()
        with BuildLine():
            ThreePointArc((3, -31), (0.878679656, -30.121320344), (0, -28))
            Line((0, -28), (0, -31))
            Line((0, -31), (3, -31))
        make_face()
        with BuildLine():
            ThreePointArc((0, 28), (0.878679656, 30.121320344), (3, 31))
            Line((3, 31), (0, 31))
            Line((0, 31), (0, 28))
        make_face()
        with BuildLine():
            ThreePointArc((5, 31), (7.121320344, 30.121320344), (8, 28))
            Line((8, 28), (8, 31))
            Line((8, 31), (5, 31))
        make_face()
    extrude(amount=RACCORDO2_3_DEPTH, mode=Mode.SUBTRACT)

    # Raccordo2 4 outline → Raccordo2 4 (cut)
    with BuildSketch(Plane(origin=(0, 0, 0), x_dir=(1, 0, 0), z_dir=(0, 1, 0)).offset(RACCORDO2_START_3)):
        with BuildLine():
            ThreePointArc((42, -7), (41.121320344, -9.121320344), (39, -10))
            Line((39, -10), (42, -10))
            Line((42, -10), (42, -7))
        make_face()
    extrude(amount=RACCORDO2_4_DEPTH, mode=Mode.SUBTRACT)

    # Raccordo2 5 outline → Raccordo2 5 (cut)
    with BuildSketch(Plane(origin=(0, 0, 0), x_dir=(1, 0, 0), z_dir=(0, 1, 0)).offset(RACCORDO2_START_4)):
        with BuildLine():
            ThreePointArc((42, -7), (41.121320344, -9.121320344), (39, -10))
            Line((39, -10), (42, -10))
            Line((42, -10), (42, -7))
        make_face()
    extrude(amount=RACCORDO2_5_DEPTH, mode=Mode.SUBTRACT)

    # Raccordo2 6 outline → Raccordo2 6 (cut)
    with BuildSketch(Plane.YZ.offset(RACCORDO2_START_5)):
        with BuildLine():
            ThreePointArc((22, 19), (24.121320344, 18.121320344), (25, 16))
            Line((25, 16), (25, 19))
            Line((25, 19), (22, 19))
        make_face()
        with BuildLine():
            ThreePointArc((-7.5, 40), (-6.621320344, 42.121320344), (-4.5, 43))
            Line((-4.5, 43), (-7.5, 43))
            Line((-7.5, 43), (-7.5, 40))
        make_face()
        with BuildLine():
            ThreePointArc((4.5, 43), (6.621320344, 42.121320344), (7.5, 40))
            Line((7.5, 40), (7.5, 43))
            Line((7.5, 43), (4.5, 43))
        make_face()
        with BuildLine():
            Line((-25, 19), (-25, 16))
            ThreePointArc((-25, 16), (-24.121320344, 18.121320344), (-22, 19))
            Line((-22, 19), (-25, 19))
        make_face()
    extrude(amount=RACCORDO2_6_DEPTH, mode=Mode.SUBTRACT)

    # Raccordo30
    raccordo30_edges = [part.edges().sort_by_distance(p)[0] for p in [
        (39, 23, 1.063508327),
        (39, -23, 1.063508327),
    ]]
    fillet(raccordo30_edges, radius=RACCORDO30_R - 0.0001)  # a hair under: the kernel refuses the full size

    # Schizzo30 → Taglio-Estrusione5 (cut)
    with BuildSketch(Plane(origin=(42, 0, 0), x_dir=(0, 0, -1), z_dir=(1, 0, 0))):
        with Locations((-47, 0)):
            Circle(SCHIZZO30_R)
    extrude(amount=-TAGLIO_ESTRUSIONE5_DEPTH, mode=Mode.SUBTRACT)


solid = part.part
